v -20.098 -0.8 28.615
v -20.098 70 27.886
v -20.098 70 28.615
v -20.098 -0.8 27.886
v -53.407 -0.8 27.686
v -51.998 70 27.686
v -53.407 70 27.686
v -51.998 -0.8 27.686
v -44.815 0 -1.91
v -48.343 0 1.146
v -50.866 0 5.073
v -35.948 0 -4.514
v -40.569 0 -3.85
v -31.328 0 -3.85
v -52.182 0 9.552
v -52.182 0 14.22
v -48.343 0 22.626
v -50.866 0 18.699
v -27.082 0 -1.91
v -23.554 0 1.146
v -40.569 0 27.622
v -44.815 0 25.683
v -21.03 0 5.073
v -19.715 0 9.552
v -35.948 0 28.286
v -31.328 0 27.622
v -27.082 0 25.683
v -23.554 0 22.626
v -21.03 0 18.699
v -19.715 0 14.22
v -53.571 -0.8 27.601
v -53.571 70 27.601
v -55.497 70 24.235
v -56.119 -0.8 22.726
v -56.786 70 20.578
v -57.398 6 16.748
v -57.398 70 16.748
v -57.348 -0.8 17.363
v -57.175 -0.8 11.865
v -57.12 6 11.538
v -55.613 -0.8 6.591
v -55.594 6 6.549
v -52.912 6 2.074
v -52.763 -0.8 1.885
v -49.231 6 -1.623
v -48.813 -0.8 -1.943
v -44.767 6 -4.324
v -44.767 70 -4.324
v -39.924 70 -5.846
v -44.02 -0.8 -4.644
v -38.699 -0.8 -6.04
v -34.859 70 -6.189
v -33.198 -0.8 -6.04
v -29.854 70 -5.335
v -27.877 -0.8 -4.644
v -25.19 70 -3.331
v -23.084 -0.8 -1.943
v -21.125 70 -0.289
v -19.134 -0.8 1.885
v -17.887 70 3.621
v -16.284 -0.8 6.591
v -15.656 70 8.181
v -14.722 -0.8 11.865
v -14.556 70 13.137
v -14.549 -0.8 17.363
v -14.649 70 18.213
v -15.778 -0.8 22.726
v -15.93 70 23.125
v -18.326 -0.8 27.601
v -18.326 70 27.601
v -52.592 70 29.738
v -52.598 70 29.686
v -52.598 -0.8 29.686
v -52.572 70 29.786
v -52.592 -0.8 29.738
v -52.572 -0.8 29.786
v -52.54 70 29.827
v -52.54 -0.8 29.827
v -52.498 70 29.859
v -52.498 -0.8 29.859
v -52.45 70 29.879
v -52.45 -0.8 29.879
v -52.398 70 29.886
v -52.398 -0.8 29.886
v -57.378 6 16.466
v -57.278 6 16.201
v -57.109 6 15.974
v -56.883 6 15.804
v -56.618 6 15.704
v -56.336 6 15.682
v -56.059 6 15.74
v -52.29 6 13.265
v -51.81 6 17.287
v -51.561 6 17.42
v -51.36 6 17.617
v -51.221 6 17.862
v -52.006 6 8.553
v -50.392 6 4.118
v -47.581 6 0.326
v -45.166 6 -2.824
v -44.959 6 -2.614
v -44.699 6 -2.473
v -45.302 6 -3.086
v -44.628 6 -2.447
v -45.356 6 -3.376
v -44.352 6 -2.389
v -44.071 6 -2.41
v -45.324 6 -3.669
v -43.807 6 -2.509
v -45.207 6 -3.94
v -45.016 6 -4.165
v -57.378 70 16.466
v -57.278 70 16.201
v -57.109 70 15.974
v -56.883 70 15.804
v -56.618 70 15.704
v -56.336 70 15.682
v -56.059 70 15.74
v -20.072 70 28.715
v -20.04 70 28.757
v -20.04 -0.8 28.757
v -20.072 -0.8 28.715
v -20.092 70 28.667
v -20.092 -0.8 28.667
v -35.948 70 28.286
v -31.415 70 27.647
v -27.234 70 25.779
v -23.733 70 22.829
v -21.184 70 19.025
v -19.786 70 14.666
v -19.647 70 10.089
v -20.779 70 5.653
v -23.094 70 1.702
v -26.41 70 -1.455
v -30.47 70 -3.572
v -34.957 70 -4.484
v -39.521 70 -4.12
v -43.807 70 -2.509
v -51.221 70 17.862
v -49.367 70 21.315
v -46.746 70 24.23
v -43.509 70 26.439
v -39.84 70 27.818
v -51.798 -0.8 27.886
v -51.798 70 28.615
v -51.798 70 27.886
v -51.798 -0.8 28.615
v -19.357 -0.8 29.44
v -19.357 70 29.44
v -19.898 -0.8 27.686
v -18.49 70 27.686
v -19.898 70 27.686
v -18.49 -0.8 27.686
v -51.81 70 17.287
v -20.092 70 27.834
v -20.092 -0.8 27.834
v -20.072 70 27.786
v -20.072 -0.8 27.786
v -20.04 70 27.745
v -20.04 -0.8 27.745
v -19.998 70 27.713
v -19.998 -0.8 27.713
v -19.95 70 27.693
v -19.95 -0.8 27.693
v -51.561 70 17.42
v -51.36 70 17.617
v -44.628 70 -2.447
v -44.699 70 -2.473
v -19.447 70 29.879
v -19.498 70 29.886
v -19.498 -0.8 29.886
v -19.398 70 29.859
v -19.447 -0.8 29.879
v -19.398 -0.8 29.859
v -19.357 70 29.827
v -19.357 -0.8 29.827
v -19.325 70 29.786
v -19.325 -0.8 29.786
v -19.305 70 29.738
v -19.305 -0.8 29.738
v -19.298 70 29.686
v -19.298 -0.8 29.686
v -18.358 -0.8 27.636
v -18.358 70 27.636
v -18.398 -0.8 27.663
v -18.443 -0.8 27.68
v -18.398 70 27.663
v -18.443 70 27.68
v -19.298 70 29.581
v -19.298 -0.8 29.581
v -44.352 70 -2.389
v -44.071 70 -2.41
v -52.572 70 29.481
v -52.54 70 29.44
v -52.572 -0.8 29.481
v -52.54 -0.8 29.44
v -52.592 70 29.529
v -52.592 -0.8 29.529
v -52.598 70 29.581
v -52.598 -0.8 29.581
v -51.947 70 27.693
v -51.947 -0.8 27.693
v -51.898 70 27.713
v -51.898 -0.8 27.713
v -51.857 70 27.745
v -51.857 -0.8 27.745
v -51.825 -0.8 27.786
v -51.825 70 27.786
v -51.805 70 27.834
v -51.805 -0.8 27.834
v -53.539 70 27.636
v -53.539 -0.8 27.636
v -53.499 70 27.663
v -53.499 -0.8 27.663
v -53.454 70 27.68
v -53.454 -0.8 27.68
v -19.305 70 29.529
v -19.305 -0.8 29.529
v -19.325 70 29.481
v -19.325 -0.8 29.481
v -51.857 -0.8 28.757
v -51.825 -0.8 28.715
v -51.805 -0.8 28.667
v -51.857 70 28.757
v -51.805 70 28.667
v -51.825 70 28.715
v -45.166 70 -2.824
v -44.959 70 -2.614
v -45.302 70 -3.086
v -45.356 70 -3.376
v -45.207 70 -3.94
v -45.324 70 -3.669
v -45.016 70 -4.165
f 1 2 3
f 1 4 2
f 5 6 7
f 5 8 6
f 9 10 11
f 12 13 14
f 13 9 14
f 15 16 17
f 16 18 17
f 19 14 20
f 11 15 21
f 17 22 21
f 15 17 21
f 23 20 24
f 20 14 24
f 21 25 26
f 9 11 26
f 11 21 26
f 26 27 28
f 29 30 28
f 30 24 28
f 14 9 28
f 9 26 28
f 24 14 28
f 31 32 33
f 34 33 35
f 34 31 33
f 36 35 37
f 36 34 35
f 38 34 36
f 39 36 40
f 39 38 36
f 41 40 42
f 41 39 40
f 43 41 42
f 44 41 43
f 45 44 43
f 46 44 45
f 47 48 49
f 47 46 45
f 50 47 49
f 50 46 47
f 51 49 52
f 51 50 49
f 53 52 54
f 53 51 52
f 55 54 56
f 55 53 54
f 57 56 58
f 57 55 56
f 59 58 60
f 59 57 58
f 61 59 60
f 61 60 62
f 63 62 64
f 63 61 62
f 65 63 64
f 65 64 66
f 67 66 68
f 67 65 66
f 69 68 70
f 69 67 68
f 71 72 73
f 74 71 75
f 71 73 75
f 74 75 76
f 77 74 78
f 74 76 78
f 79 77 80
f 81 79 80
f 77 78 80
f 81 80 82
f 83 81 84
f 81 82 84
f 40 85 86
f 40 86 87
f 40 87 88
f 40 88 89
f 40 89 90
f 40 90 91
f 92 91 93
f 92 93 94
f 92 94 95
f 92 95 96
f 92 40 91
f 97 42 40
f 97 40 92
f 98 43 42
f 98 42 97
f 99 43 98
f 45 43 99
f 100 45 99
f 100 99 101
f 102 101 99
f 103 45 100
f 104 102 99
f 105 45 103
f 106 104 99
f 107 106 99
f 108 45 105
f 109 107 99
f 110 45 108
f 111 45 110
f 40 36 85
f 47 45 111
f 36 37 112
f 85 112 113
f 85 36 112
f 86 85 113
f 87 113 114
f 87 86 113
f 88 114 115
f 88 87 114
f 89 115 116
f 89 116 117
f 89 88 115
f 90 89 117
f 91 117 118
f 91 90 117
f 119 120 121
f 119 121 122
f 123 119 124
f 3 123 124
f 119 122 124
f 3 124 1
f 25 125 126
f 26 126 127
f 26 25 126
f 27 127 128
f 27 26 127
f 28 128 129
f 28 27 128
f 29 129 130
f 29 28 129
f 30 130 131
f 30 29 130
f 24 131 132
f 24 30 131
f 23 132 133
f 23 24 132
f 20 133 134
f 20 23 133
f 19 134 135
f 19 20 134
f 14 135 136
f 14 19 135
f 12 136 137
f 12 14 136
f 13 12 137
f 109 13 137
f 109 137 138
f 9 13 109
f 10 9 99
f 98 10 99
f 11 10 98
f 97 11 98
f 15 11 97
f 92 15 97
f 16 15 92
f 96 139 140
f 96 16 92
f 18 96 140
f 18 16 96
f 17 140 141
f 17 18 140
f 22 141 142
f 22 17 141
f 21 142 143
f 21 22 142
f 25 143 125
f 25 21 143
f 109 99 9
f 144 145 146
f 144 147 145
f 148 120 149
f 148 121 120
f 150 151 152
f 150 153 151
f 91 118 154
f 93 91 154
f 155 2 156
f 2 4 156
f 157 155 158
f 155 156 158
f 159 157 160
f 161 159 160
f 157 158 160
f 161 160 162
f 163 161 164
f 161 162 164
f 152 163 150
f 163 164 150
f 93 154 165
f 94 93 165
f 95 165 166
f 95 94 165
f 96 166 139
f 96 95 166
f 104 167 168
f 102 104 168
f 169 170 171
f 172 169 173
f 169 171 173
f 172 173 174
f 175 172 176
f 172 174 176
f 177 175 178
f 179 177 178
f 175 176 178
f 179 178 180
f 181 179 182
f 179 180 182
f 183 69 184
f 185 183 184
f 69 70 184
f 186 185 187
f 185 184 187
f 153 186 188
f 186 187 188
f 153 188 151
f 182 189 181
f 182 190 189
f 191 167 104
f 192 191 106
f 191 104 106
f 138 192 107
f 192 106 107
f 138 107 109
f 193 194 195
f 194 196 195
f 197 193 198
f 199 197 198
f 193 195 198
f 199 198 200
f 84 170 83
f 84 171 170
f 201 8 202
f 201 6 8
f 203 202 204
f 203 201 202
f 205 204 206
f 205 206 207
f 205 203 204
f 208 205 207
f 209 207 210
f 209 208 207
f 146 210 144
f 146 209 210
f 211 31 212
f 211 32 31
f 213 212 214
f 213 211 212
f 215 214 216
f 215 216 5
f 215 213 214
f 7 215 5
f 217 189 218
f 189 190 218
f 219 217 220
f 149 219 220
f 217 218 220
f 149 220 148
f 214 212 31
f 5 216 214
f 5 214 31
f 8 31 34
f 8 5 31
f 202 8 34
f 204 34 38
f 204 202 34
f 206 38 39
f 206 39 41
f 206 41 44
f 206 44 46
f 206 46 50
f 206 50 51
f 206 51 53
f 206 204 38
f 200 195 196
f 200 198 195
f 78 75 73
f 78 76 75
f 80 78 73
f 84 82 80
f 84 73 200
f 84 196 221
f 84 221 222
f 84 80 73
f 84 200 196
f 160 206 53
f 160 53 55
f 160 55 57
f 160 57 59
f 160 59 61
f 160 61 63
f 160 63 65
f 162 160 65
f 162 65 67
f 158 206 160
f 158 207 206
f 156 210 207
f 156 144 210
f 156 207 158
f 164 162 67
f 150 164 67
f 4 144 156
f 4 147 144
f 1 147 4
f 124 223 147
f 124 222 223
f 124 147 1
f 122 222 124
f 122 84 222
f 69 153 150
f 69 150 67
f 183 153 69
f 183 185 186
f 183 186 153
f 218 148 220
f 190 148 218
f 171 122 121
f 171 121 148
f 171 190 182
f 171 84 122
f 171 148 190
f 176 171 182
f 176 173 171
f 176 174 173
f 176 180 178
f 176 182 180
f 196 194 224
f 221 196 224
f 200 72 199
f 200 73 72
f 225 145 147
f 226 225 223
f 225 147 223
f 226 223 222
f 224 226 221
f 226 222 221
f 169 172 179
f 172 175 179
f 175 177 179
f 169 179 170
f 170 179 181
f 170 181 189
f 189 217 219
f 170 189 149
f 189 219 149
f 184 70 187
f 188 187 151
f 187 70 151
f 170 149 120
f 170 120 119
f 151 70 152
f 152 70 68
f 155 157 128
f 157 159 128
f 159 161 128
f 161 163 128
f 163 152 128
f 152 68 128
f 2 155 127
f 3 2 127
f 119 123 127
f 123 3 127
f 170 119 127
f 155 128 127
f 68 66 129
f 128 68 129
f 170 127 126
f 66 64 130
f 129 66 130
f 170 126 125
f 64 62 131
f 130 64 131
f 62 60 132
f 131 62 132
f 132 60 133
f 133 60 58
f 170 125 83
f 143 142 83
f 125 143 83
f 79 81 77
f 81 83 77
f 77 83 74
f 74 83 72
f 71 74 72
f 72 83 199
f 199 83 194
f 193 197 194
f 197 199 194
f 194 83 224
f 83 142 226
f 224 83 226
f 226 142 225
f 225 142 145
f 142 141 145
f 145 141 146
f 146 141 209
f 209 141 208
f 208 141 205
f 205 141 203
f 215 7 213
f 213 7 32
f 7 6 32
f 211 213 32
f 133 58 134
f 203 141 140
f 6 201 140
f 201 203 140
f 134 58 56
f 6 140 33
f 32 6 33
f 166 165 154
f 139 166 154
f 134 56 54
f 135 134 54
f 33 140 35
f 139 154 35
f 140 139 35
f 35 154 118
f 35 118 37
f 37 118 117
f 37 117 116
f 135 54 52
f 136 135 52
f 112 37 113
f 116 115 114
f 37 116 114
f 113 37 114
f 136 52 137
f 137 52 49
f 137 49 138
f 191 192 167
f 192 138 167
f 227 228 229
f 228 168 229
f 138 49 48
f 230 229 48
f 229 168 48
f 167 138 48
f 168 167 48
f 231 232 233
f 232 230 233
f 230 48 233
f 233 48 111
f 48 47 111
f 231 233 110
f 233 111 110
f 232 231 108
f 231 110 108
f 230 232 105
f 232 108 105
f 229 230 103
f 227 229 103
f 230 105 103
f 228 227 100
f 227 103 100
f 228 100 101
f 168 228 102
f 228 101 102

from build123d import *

# Parameters (mm, degrees)
SKETCH1_R           = 16.4
BOSS_EXTRUDE1_DEPTH = 70
BOSS_EXTRUDE2_START = 0.8
BOSS_EXTRUDE2_DEPTH = 0.8
CUT_EXTRUDE1_DEPTH  = 64
FILLET1_R           = 1
FILLET2_R           = 0.2


with BuildPart() as part:
    # Sketch1 → Boss-Extrude1 (new body)
    with BuildSketch(Plane(origin=(0, 0, 0), x_dir=(1, 0, 0), z_dir=(0, 1, 0))):
        with BuildLine():
            Line((-18.386301809, -27.686071188), (-20.098433843, -27.686071188))
            Line((-20.098433843, -27.686071188), (-20.098433843, -28.698203222))
            Line((-20.098433843, -28.698203222), (-19.298433843, -29.498203222))
            Line((-19.298433843, -29.498203222), (-19.298433843, -29.886071188))
            Line((-19.298433843, -29.886071188), (-52.598433843, -29.886071188))
            Line((-52.598433843, -29.886071188), (-52.598433843, -29.498203222))
            Line((-52.598433843, -29.498203222), (-51.798433843, -28.698203222))
            Line((-51.798433843, -28.698203222), (-51.798433843, -27.686071188))
            Line((-51.798433843, -27.686071188), (-53.510565878, -27.686071188))
            ThreePointArc((-53.510565878, -27.686071188), (-35.948433843, 6.216409145), (-18.386301809, -27.686071188))
        make_face()
        with Locations(Location((-35.948433843, -11.886071188, 0), (0, 0, 270))):
            Circle(SKETCH1_R, mode=Mode.SUBTRACT)
    extrude(amount=BOSS_EXTRUDE1_DEPTH)

    # Sketch2 → Boss-Extrude2 (add)
    with BuildSketch(Plane.XZ.offset(BOSS_EXTRUDE2_START)):
        with BuildLine():
            Line((-18.386301809, 27.686071188), (-20.098433843, 27.686071188))
            Line((-20.098433843, 27.686071188), (-20.098433843, 28.698203222))
            Line((-20.098433843, 28.698203222), (-19.298433843, 29.498203222))
            Line((-19.298433843, 29.498203222), (-19.298433843, 29.886071188))
            Line((-19.298433843, 29.886071188), (-52.598433843, 29.886071188))
            Line((-52.598433843, 29.886071188), (-52.598433843, 29.498203222))
            Line((-52.598433843, 29.498203222), (-51.798433843, 28.698203222))
            Line((-51.798433843, 28.698203222), (-51.798433843, 27.686071188))
            Line((-51.798433843, 27.686071188), (-53.510565878, 27.686071188))
            ThreePointArc((-53.510565878, 27.686071188), (-35.948433843, -6.216409145), (-18.386301809, 27.686071188))
        make_face()
    extrude(amount=-BOSS_EXTRUDE2_DEPTH)

    # Sketch3 → Cut-Extrude1 (cut)
    with BuildSketch(Plane(origin=(0, 70, 0), x_dir=(1, 0, 0), z_dir=(0, 1, 0))):
        Polygon((-49.615972348, -18.085360607), (-42.433549338, 1.648184429), (-57.414050135, 7.100640814), (-64.596473145, -12.632904223), align=None)
    extrude(amount=-CUT_EXTRUDE1_DEPTH, mode=Mode.SUBTRACT)

    # Fillet1
    fillet1_edges = [part.edges().sort_by_distance(p)[0] for p in [
        (-44.195484744, 38, -2.289476472),
        (-51.377907754, 38, 17.444068565),
        (-57.448378022, 38, 15.234598079),
        (-46.841576343, 38, -3.252575051),
    ]]
    fillet(fillet1_edges, radius=FILLET1_R)

    # Fillet2
    fillet2_edges = [part.edges().sort_by_distance(p)[0] for p in [
        (-18.386301809, 34.6, 27.686071188),
        (-20.098433843, 34.6, 27.686071188),
        (-20.098433843, 34.6, 28.698203222),
        (-19.298433843, 34.6, 29.498203222),
        (-19.298433843, 34.6, 29.886071188),
        (-52.598433843, 34.6, 29.886071188),
        (-52.598433843, 34.6, 29.498203222),
        (-51.798433843, 34.6, 28.698203222),
        (-51.798433843, 34.6, 27.686071188),
        (-53.510565878, 34.6, 27.686071188),
    ]]
    fillet(fillet2_edges, radius=FILLET2_R)


solid = part.part
